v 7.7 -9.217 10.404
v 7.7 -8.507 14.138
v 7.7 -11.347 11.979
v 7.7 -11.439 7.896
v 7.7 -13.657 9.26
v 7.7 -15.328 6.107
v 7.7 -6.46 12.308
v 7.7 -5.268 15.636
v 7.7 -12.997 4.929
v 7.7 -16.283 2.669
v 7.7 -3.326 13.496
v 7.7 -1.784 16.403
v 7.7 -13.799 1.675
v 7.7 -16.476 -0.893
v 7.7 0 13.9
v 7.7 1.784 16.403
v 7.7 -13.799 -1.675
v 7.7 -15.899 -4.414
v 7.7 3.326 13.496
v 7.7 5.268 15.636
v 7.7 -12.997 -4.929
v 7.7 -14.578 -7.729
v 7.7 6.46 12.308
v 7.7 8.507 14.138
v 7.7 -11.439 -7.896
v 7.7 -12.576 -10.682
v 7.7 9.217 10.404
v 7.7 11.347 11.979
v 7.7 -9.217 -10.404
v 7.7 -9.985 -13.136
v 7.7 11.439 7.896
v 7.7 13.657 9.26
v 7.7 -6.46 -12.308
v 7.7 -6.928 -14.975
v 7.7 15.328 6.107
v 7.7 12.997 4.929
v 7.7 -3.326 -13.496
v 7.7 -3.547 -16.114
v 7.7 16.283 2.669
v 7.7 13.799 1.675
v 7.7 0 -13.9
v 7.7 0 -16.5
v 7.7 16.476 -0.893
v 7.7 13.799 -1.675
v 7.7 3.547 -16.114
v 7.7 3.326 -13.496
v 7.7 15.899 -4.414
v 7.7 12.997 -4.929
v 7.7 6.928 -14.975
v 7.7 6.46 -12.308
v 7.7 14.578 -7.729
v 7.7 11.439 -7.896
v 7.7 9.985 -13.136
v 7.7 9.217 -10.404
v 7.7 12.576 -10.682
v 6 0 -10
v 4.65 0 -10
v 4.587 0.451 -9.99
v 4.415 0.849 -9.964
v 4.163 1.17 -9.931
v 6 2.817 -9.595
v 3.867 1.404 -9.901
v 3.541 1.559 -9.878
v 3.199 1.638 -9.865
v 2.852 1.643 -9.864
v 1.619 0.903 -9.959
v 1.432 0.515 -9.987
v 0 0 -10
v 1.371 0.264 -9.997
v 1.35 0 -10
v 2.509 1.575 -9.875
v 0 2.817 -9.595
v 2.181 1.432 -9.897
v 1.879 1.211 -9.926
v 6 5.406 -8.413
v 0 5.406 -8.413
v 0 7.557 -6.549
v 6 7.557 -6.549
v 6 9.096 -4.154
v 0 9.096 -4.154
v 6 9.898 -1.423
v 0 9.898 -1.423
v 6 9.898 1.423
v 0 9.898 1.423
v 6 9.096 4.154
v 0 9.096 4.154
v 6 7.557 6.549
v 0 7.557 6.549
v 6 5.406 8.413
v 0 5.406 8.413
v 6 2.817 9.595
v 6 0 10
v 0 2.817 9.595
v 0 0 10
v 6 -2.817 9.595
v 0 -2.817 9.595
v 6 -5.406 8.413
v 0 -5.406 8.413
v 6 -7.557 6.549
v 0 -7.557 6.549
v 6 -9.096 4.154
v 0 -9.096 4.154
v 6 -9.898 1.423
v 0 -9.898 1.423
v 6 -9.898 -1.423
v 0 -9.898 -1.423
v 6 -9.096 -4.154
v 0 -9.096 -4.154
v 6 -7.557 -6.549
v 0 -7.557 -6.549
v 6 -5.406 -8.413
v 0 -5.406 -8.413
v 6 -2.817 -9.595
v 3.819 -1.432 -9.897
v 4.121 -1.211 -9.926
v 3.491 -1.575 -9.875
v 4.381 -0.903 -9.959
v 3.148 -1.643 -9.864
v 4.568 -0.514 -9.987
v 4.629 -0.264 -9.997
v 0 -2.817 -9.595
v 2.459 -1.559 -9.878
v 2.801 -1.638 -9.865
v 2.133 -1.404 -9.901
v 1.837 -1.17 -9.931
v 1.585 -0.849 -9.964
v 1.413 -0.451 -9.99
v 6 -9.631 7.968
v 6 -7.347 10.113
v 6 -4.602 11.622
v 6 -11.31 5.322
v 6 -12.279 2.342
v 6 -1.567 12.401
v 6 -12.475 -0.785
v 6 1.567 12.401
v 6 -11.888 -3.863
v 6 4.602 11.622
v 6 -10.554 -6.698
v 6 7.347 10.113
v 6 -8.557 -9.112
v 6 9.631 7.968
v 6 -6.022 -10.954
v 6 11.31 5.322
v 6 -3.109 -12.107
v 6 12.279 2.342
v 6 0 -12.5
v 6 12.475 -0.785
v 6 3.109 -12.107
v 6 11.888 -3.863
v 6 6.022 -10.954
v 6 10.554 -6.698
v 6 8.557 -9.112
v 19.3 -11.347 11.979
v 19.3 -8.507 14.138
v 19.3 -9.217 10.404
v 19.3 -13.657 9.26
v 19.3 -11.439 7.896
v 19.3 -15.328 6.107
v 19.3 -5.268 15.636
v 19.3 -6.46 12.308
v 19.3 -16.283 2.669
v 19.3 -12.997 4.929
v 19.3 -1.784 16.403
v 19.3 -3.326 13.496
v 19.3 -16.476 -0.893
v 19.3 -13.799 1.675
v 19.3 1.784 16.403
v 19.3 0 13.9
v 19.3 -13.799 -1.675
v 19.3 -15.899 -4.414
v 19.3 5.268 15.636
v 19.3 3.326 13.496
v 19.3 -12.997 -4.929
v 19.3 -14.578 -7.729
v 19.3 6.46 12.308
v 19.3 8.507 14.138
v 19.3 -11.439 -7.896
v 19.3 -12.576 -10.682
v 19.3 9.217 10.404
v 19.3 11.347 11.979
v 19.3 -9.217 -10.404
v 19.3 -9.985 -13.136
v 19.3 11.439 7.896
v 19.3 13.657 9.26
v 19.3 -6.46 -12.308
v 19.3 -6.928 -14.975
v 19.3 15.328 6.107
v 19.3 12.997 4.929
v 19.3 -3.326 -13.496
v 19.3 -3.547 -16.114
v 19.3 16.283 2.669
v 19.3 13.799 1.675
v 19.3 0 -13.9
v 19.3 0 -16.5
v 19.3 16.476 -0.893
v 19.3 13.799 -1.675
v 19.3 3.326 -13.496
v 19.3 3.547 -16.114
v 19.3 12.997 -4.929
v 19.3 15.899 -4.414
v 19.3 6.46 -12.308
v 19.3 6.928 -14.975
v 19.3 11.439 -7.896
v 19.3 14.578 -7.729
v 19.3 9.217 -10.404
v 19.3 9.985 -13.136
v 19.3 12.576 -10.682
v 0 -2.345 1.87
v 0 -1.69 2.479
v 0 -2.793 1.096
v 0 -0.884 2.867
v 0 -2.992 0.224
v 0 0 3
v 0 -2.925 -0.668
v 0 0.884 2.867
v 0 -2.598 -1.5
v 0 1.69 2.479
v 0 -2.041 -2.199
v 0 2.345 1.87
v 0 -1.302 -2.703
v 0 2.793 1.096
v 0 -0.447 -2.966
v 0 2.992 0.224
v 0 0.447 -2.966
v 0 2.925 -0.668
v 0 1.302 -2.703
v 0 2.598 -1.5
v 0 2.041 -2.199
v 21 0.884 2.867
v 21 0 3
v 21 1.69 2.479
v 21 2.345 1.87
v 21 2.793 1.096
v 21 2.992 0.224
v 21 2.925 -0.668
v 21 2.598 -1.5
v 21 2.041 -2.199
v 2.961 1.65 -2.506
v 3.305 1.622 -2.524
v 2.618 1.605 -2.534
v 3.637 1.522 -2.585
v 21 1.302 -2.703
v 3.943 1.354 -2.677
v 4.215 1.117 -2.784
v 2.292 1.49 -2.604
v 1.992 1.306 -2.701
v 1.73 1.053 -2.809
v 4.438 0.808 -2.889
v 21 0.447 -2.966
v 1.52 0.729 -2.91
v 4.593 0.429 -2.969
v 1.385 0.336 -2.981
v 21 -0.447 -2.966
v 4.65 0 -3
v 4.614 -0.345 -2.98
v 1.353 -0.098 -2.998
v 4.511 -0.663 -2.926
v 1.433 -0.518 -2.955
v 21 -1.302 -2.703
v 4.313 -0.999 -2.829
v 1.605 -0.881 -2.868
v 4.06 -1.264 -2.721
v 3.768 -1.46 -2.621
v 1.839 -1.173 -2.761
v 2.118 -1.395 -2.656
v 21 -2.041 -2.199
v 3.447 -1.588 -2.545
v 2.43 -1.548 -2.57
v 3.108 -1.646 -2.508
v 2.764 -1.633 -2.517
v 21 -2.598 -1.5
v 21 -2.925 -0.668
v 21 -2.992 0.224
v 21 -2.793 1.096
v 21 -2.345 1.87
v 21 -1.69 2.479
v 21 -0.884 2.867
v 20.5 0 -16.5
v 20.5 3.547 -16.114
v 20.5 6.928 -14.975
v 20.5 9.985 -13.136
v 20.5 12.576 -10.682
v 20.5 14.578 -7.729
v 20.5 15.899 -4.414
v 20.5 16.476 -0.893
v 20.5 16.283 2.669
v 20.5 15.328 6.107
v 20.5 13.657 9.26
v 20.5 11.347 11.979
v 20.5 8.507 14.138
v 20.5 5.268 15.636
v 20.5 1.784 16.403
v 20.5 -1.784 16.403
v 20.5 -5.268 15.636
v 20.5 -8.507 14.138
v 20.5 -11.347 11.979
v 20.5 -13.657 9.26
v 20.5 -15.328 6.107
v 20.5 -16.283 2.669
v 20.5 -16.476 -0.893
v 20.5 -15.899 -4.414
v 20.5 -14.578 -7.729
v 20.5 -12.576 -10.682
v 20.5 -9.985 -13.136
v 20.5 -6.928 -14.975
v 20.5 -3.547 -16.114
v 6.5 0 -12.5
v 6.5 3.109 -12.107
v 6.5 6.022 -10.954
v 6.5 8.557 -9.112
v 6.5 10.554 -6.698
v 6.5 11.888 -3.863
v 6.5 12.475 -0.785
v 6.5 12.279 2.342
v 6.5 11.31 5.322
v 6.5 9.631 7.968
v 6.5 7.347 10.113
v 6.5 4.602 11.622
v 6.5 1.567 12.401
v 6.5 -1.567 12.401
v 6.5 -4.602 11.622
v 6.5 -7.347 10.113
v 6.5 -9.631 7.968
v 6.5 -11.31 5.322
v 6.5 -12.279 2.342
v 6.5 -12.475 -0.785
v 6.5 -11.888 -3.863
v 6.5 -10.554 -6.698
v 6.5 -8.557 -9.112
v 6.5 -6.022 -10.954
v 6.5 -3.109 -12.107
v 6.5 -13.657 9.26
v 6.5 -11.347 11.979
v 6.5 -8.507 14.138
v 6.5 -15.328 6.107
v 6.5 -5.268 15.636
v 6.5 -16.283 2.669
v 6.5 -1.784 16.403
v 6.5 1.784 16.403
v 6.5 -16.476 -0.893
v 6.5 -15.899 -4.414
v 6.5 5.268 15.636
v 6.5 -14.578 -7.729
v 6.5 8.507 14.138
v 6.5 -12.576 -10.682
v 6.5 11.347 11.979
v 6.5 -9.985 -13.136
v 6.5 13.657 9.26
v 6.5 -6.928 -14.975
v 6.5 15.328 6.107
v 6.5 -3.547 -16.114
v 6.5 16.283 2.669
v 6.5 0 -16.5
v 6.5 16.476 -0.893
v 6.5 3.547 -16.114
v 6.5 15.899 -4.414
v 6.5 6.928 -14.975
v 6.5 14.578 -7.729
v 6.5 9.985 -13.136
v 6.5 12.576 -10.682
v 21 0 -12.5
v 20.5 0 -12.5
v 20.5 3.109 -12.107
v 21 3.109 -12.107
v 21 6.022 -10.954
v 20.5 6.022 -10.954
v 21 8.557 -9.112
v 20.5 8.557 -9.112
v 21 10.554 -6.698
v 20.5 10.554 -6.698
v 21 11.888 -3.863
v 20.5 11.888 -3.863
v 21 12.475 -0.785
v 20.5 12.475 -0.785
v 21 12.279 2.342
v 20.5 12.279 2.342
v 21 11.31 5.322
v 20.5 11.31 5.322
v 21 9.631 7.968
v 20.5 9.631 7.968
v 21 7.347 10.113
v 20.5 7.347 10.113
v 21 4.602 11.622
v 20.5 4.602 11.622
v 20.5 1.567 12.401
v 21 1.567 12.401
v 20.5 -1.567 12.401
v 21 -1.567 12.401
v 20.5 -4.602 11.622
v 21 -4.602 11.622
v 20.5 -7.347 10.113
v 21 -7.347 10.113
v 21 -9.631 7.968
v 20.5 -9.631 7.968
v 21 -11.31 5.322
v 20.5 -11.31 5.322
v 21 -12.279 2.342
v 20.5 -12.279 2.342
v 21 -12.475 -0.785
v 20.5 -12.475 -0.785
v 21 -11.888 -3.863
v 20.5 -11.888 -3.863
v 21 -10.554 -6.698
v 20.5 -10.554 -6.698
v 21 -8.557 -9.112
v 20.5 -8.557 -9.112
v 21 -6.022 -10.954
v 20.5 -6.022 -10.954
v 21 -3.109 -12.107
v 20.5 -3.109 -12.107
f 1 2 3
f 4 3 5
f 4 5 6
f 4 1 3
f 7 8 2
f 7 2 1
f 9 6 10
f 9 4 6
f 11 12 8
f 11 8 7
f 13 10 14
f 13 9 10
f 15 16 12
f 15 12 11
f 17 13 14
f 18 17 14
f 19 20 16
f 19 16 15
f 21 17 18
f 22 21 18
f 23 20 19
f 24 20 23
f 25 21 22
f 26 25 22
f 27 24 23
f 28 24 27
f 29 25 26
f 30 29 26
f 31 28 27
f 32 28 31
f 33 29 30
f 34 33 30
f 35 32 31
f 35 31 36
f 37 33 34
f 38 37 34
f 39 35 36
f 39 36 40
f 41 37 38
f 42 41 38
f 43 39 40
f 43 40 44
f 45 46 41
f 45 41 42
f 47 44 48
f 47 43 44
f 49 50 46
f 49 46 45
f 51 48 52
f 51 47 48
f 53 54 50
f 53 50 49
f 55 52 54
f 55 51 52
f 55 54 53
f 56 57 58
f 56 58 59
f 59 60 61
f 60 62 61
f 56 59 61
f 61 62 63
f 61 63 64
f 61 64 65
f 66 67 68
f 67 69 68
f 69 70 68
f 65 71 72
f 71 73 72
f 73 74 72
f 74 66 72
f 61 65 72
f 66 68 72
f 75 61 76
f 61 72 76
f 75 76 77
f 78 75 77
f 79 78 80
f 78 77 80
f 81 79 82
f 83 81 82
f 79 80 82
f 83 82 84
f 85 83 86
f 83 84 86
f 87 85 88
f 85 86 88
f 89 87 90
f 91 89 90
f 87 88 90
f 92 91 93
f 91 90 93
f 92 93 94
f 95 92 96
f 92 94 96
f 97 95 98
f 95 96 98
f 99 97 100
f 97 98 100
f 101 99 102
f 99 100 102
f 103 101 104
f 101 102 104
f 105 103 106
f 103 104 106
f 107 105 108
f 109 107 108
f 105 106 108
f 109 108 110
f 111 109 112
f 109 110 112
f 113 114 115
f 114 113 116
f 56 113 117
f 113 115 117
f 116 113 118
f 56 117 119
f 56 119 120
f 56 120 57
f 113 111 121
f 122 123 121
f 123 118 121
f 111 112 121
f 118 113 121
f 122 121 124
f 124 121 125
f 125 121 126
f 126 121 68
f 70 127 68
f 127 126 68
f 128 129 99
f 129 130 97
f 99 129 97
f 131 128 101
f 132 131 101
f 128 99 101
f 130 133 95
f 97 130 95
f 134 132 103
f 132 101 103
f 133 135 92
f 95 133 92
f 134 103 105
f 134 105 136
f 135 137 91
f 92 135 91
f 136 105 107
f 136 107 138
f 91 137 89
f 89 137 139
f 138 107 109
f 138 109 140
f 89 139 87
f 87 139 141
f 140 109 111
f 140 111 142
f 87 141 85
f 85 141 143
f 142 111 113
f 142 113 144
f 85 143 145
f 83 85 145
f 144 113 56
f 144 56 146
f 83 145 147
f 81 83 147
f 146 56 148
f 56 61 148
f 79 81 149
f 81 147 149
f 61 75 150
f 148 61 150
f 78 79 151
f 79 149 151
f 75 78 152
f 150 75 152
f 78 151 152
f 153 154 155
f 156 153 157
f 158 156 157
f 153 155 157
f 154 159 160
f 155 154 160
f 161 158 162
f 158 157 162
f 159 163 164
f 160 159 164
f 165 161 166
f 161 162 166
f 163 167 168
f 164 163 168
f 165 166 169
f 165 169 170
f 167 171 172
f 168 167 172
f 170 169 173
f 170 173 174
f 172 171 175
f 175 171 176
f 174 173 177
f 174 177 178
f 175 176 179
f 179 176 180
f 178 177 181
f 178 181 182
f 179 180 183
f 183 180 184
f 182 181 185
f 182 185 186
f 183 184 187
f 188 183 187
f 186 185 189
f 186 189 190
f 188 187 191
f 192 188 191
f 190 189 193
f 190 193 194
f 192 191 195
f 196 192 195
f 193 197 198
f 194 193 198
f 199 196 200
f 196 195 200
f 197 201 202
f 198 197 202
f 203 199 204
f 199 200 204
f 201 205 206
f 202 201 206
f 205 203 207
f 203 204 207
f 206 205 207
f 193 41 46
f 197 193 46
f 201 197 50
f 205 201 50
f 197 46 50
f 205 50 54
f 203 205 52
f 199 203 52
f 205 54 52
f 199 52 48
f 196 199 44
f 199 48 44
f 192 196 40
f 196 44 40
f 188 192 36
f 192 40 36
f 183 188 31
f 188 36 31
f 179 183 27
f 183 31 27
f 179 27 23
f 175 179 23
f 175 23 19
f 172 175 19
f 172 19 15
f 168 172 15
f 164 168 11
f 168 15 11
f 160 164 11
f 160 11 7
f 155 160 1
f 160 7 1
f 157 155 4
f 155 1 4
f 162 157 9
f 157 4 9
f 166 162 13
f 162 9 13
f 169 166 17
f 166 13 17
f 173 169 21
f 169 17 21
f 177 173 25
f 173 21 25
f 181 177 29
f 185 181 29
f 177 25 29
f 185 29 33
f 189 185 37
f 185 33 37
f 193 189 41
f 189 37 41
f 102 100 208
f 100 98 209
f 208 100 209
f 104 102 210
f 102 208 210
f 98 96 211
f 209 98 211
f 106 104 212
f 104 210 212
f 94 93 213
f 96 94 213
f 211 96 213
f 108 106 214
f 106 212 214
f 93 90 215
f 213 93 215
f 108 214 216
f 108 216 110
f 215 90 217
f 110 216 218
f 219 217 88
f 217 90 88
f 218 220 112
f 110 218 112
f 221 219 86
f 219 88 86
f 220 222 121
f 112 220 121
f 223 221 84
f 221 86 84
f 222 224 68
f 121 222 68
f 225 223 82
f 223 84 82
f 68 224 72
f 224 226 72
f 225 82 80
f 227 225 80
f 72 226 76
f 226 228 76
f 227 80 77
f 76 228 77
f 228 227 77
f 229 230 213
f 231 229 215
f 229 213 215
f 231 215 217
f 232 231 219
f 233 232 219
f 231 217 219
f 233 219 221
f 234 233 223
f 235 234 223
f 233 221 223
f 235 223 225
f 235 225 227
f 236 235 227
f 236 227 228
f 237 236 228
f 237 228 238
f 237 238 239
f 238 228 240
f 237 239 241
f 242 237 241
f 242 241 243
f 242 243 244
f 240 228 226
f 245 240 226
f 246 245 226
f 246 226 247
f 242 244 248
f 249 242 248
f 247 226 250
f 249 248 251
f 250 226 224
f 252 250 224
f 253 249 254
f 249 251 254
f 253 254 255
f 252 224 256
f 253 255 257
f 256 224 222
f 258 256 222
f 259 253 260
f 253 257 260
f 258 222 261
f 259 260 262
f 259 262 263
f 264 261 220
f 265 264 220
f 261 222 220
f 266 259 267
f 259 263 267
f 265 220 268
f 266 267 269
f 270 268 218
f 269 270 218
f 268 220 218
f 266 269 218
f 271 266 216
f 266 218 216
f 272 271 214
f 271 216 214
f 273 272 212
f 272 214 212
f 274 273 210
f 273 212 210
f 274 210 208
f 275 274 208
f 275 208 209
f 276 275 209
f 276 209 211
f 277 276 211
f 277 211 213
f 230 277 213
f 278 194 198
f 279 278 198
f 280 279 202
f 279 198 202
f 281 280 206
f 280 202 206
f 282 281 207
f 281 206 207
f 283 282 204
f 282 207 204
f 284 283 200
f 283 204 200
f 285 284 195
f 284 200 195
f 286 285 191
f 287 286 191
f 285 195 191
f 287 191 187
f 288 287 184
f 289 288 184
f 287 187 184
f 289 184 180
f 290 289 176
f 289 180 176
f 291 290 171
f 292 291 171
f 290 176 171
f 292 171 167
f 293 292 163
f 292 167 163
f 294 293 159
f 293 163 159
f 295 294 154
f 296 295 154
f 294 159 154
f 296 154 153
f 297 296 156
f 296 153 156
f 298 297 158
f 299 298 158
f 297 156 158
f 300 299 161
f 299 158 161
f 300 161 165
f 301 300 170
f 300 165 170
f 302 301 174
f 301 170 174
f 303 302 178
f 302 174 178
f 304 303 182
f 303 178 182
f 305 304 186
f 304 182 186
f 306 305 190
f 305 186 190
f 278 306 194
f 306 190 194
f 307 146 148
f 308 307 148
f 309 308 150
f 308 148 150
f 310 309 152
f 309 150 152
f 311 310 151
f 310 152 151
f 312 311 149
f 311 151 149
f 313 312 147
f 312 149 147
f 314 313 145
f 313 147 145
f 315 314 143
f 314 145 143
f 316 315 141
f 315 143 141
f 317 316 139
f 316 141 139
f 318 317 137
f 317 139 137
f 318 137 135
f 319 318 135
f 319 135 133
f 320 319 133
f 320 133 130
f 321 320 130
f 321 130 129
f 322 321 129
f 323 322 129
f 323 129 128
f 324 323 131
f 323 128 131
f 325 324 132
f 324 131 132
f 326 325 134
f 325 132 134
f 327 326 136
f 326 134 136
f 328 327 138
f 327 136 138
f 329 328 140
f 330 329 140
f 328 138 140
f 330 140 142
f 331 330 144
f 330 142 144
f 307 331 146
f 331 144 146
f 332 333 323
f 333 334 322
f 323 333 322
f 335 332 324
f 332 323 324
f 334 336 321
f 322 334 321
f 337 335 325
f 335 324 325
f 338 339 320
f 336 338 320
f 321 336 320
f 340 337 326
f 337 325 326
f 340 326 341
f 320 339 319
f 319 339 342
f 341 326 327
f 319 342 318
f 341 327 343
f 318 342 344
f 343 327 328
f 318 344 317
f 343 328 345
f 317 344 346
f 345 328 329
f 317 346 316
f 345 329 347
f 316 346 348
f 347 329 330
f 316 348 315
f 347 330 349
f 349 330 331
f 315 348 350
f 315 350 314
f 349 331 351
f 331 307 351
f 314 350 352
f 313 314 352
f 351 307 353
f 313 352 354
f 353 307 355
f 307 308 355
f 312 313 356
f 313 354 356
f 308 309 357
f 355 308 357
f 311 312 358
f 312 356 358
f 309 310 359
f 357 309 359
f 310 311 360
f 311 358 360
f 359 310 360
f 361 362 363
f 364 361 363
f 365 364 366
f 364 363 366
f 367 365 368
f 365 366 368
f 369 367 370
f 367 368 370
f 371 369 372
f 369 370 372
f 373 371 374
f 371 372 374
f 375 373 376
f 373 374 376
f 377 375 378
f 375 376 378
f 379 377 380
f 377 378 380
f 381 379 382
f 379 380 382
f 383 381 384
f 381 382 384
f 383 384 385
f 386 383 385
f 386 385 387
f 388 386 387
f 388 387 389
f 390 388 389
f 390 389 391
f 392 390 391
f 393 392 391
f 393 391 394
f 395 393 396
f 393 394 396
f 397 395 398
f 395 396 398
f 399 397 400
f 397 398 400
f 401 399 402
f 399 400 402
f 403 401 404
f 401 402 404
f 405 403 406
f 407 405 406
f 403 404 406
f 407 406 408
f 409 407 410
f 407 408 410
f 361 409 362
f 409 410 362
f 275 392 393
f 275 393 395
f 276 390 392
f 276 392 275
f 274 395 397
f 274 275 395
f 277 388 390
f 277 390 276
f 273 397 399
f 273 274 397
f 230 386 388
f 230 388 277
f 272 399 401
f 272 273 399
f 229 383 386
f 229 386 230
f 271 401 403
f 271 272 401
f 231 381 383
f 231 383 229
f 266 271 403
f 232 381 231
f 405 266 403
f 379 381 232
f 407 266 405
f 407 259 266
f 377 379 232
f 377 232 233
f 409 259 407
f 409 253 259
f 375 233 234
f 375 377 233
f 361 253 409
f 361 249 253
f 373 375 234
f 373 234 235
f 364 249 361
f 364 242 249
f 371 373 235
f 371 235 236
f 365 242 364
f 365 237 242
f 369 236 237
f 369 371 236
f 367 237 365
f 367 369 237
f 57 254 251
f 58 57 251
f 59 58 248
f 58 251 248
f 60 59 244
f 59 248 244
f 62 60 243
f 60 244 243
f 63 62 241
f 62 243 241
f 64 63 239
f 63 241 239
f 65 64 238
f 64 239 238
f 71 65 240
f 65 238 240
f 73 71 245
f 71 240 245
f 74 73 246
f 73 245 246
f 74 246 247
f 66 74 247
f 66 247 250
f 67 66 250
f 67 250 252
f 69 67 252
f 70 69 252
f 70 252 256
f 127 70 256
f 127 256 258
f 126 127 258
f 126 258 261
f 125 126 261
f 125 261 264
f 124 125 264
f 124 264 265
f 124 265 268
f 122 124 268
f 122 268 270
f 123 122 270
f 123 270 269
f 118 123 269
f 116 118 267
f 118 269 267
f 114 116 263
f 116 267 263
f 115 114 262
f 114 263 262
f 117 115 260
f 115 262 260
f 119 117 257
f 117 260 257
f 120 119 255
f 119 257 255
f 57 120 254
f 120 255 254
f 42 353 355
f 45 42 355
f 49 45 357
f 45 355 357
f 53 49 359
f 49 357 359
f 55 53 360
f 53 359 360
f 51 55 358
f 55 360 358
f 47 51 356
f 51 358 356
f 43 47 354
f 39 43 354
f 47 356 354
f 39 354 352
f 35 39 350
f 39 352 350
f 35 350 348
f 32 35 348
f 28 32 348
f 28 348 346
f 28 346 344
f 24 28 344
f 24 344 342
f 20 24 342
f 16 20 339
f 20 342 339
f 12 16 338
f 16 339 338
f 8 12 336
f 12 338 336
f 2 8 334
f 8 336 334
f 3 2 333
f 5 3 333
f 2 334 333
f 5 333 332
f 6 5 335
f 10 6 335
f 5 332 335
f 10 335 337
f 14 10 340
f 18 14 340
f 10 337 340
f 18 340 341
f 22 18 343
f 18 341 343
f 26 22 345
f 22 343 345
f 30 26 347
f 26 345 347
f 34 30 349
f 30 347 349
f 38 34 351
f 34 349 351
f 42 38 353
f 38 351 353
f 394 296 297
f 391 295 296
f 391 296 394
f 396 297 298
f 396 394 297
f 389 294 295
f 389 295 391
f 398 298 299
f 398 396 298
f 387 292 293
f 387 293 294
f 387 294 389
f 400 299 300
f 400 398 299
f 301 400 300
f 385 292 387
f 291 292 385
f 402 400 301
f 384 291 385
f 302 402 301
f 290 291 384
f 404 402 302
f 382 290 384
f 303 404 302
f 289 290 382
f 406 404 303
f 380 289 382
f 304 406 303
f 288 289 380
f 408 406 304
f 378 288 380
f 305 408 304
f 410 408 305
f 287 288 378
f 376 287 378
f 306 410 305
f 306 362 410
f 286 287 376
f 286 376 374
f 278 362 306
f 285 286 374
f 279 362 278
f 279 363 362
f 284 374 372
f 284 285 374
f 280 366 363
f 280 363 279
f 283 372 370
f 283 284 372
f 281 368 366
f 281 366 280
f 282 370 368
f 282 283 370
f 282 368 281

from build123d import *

# Parameters (mm, degrees)
CROQUIS1_R                = 10
SALIENTE_EXTRUIR1_DEPTH   = 6
CROQUIS2_R                = 12.5
SALIENTE_EXTRUIR2_DEPTH   = 0.5
CROQUIS3_R                = 16.5
SALIENTE_EXTRUIR3_DEPTH   = 1.2
CROQUIS4_R                = 13.9
SALIENTE_EXTRUIR4_DEPTH   = 11.6
CROQUIS5_R                = 16.5
SALIENTE_EXTRUIR5_DEPTH   = 1.2
CROQUIS6_R                = 12.5
SALIENTE_EXTRUIR6_DEPTH   = 0.5
CROQUIS7_R                = 3
CORTAR_EXTRUIR1_DEPTH     = 32.392674305
TALADRO_ROSCADO_M41_D     = 3.3
TALADRO_ROSCADO_M41_DEPTH = 11.5
TALADRO_ROSCADO_M41_TIP   = 0.991420021


with BuildPart() as part:
    # Croquis1 → Saliente-Extruir1 (new body)
    with BuildSketch(Plane(origin=(0, 0, 0), x_dir=(0, 0, -1), z_dir=(1, 0, 0))):
        Circle(CROQUIS1_R)
    extrude(amount=SALIENTE_EXTRUIR1_DEPTH)

    # Croquis2 → Saliente-Extruir2 (add)
    with BuildSketch(Plane(origin=(6, 0, 0), x_dir=(0, 0, -1), z_dir=(1, 0, 0))):
        Circle(CROQUIS2_R)
    extrude(amount=SALIENTE_EXTRUIR2_DEPTH)

    # Croquis3 → Saliente-Extruir3 (add)
    with BuildSketch(Plane(origin=(6.5, 0, 0), x_dir=(0, 0, -1), z_dir=(1, 0, 0))):
        Circle(CROQUIS3_R)
    extrude(amount=SALIENTE_EXTRUIR3_DEPTH)

    # Croquis4 → Saliente-Extruir4 (add)
    with BuildSketch(Plane(origin=(7.7, 0, 0), x_dir=(0, 0, -1), z_dir=(1, 0, 0))):
        Circle(CROQUIS4_R)
    extrude(amount=SALIENTE_EXTRUIR4_DEPTH)

    # Croquis5 → Saliente-Extruir5 (add)
    with BuildSketch(Plane(origin=(19.3, 0, 0), x_dir=(0, 0, -1), z_dir=(1, 0, 0))):
        Circle(CROQUIS5_R)
    extrude(amount=SALIENTE_EXTRUIR5_DEPTH)

    # Croquis6 → Saliente-Extruir6 (add)
    with BuildSketch(Plane(origin=(20.5, 0, 0), x_dir=(0, 0, -1), z_dir=(1, 0, 0))):
        Circle(CROQUIS6_R)
    extrude(amount=SALIENTE_EXTRUIR6_DEPTH)

    # Croquis7 → Cortar-Extruir1 (cut, through all)
    with BuildSketch(Plane.ZY):
        Circle(CROQUIS7_R)
    extrude(amount=-CORTAR_EXTRUIR1_DEPTH, mode=Mode.SUBTRACT)

    # Taladro roscado M41
    with Locations(Plane(origin=(0, 0, -10), x_dir=(-1, 0, 0), z_dir=(0, 0, -1))):
        with Locations((-3, 0)):
            Hole(TALADRO_ROSCADO_M41_D / 2, depth=TALADRO_ROSCADO_M41_DEPTH)
            with Locations((0, 0, -(TALADRO_ROSCADO_M41_DEPTH + TALADRO_ROSCADO_M41_TIP / 2))):  # 118° drill point
                Cone(0, TALADRO_ROSCADO_M41_D / 2, TALADRO_ROSCADO_M41_TIP, mode=Mode.SUBTRACT)


solid = part.part
